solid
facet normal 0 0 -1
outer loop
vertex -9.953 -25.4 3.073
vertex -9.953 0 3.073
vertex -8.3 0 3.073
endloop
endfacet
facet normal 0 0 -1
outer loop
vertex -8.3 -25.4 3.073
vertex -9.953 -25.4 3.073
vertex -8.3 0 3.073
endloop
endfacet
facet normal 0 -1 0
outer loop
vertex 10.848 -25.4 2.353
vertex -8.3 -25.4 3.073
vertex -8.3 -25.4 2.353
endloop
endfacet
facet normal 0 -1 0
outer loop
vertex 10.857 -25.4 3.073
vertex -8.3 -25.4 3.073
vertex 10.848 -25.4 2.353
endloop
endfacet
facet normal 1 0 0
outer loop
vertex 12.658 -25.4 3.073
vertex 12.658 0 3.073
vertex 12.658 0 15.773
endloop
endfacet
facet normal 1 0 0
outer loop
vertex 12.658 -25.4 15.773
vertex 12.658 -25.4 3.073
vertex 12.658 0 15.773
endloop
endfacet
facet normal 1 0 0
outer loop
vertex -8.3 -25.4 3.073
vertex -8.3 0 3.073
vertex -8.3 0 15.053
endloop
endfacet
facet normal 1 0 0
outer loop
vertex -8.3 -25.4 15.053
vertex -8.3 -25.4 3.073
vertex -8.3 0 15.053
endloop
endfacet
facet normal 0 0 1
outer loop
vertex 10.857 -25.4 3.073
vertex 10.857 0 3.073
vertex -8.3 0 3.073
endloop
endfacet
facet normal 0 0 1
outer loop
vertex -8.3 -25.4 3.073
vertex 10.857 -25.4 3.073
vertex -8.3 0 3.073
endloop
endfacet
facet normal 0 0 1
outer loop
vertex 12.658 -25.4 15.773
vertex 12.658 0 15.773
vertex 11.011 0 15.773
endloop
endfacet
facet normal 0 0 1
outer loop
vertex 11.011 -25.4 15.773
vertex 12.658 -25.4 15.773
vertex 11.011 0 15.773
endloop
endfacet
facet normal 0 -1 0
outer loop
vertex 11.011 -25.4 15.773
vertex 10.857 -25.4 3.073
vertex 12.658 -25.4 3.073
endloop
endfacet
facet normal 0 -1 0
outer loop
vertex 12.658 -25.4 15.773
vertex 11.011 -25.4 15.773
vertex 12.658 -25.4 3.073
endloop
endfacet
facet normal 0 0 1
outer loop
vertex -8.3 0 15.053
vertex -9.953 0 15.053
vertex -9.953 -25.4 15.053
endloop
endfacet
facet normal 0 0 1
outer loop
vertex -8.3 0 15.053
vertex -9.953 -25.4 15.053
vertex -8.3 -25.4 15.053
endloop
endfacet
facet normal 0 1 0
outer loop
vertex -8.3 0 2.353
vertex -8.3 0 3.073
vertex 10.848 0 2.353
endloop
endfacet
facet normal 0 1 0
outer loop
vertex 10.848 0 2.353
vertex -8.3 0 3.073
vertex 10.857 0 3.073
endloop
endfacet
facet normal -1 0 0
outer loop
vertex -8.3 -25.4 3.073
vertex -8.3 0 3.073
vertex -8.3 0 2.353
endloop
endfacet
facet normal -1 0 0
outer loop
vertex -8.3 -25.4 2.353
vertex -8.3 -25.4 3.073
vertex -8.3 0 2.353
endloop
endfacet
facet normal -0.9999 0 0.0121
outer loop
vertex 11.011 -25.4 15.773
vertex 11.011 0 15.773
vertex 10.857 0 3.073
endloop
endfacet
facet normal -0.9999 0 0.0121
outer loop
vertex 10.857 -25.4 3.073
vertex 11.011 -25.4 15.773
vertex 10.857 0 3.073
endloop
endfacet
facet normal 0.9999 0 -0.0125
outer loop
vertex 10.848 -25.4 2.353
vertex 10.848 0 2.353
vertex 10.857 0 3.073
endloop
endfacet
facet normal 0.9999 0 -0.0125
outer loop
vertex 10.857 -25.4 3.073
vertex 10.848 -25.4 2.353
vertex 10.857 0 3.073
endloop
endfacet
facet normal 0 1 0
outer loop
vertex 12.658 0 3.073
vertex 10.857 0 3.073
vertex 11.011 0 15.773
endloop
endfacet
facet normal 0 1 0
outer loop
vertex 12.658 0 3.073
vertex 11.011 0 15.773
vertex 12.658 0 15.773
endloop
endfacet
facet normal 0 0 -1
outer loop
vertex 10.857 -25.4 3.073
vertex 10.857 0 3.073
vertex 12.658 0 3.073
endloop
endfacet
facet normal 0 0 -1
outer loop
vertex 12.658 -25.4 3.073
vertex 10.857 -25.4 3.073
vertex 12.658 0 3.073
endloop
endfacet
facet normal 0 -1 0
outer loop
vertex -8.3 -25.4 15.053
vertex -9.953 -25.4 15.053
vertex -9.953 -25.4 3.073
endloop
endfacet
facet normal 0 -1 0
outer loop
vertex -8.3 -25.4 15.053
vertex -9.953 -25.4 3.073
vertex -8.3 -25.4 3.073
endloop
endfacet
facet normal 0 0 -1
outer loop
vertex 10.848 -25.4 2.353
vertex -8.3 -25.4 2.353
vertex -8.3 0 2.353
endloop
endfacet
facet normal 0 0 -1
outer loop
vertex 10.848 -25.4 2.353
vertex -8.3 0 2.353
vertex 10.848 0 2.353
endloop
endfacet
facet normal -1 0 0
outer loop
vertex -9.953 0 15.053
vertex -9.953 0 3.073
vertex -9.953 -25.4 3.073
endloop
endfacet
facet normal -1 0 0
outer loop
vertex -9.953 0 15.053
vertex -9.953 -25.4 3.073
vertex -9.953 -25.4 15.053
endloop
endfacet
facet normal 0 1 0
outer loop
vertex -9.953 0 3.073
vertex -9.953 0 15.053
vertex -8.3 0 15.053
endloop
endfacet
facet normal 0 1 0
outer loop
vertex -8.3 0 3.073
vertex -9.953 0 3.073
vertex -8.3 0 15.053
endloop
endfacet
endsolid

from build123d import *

# Parameters (mm, degrees)
F1_DEPTH = 25.4
F0_W     = 1.6530854926
F0_H     = 11.9800508386


with BuildPart() as f1:
    # F0 (on Front) → F1 (new body)
    with BuildSketch(Plane.XZ):
        Polygon((10.8571308537, 3.0726285186), (-8.2998636753, 3.0726285186), (-8.2998636753, 2.3526793572), (8.1842970103, 2.3526793572), (10.848434642, 2.3526793572), align=None)
    extrude(amount=F1_DEPTH)


with BuildPart() as f1b:
    # F0 (on Front) → F1, piece 2 (new body)
    with BuildSketch(Plane.XZ):
        with Locations((-9.1264064216, 9.0626539379)):
            Rectangle(F0_W, F0_H)
    extrude(amount=F1_DEPTH)


with BuildPart() as f1c:
    # F0 (on Front) → F1, piece 3 (new body)
    with BuildSketch(Plane.XZ):
        Polygon((11.0105331987, 15.7726285186), (10.8571308537, 3.0726285186), (12.657715939, 3.0726285186), (12.657715939, 15.7726285186), align=None)
    extrude(amount=F1_DEPTH)


solid = Compound([f1.part, f1b.part, f1c.part])
